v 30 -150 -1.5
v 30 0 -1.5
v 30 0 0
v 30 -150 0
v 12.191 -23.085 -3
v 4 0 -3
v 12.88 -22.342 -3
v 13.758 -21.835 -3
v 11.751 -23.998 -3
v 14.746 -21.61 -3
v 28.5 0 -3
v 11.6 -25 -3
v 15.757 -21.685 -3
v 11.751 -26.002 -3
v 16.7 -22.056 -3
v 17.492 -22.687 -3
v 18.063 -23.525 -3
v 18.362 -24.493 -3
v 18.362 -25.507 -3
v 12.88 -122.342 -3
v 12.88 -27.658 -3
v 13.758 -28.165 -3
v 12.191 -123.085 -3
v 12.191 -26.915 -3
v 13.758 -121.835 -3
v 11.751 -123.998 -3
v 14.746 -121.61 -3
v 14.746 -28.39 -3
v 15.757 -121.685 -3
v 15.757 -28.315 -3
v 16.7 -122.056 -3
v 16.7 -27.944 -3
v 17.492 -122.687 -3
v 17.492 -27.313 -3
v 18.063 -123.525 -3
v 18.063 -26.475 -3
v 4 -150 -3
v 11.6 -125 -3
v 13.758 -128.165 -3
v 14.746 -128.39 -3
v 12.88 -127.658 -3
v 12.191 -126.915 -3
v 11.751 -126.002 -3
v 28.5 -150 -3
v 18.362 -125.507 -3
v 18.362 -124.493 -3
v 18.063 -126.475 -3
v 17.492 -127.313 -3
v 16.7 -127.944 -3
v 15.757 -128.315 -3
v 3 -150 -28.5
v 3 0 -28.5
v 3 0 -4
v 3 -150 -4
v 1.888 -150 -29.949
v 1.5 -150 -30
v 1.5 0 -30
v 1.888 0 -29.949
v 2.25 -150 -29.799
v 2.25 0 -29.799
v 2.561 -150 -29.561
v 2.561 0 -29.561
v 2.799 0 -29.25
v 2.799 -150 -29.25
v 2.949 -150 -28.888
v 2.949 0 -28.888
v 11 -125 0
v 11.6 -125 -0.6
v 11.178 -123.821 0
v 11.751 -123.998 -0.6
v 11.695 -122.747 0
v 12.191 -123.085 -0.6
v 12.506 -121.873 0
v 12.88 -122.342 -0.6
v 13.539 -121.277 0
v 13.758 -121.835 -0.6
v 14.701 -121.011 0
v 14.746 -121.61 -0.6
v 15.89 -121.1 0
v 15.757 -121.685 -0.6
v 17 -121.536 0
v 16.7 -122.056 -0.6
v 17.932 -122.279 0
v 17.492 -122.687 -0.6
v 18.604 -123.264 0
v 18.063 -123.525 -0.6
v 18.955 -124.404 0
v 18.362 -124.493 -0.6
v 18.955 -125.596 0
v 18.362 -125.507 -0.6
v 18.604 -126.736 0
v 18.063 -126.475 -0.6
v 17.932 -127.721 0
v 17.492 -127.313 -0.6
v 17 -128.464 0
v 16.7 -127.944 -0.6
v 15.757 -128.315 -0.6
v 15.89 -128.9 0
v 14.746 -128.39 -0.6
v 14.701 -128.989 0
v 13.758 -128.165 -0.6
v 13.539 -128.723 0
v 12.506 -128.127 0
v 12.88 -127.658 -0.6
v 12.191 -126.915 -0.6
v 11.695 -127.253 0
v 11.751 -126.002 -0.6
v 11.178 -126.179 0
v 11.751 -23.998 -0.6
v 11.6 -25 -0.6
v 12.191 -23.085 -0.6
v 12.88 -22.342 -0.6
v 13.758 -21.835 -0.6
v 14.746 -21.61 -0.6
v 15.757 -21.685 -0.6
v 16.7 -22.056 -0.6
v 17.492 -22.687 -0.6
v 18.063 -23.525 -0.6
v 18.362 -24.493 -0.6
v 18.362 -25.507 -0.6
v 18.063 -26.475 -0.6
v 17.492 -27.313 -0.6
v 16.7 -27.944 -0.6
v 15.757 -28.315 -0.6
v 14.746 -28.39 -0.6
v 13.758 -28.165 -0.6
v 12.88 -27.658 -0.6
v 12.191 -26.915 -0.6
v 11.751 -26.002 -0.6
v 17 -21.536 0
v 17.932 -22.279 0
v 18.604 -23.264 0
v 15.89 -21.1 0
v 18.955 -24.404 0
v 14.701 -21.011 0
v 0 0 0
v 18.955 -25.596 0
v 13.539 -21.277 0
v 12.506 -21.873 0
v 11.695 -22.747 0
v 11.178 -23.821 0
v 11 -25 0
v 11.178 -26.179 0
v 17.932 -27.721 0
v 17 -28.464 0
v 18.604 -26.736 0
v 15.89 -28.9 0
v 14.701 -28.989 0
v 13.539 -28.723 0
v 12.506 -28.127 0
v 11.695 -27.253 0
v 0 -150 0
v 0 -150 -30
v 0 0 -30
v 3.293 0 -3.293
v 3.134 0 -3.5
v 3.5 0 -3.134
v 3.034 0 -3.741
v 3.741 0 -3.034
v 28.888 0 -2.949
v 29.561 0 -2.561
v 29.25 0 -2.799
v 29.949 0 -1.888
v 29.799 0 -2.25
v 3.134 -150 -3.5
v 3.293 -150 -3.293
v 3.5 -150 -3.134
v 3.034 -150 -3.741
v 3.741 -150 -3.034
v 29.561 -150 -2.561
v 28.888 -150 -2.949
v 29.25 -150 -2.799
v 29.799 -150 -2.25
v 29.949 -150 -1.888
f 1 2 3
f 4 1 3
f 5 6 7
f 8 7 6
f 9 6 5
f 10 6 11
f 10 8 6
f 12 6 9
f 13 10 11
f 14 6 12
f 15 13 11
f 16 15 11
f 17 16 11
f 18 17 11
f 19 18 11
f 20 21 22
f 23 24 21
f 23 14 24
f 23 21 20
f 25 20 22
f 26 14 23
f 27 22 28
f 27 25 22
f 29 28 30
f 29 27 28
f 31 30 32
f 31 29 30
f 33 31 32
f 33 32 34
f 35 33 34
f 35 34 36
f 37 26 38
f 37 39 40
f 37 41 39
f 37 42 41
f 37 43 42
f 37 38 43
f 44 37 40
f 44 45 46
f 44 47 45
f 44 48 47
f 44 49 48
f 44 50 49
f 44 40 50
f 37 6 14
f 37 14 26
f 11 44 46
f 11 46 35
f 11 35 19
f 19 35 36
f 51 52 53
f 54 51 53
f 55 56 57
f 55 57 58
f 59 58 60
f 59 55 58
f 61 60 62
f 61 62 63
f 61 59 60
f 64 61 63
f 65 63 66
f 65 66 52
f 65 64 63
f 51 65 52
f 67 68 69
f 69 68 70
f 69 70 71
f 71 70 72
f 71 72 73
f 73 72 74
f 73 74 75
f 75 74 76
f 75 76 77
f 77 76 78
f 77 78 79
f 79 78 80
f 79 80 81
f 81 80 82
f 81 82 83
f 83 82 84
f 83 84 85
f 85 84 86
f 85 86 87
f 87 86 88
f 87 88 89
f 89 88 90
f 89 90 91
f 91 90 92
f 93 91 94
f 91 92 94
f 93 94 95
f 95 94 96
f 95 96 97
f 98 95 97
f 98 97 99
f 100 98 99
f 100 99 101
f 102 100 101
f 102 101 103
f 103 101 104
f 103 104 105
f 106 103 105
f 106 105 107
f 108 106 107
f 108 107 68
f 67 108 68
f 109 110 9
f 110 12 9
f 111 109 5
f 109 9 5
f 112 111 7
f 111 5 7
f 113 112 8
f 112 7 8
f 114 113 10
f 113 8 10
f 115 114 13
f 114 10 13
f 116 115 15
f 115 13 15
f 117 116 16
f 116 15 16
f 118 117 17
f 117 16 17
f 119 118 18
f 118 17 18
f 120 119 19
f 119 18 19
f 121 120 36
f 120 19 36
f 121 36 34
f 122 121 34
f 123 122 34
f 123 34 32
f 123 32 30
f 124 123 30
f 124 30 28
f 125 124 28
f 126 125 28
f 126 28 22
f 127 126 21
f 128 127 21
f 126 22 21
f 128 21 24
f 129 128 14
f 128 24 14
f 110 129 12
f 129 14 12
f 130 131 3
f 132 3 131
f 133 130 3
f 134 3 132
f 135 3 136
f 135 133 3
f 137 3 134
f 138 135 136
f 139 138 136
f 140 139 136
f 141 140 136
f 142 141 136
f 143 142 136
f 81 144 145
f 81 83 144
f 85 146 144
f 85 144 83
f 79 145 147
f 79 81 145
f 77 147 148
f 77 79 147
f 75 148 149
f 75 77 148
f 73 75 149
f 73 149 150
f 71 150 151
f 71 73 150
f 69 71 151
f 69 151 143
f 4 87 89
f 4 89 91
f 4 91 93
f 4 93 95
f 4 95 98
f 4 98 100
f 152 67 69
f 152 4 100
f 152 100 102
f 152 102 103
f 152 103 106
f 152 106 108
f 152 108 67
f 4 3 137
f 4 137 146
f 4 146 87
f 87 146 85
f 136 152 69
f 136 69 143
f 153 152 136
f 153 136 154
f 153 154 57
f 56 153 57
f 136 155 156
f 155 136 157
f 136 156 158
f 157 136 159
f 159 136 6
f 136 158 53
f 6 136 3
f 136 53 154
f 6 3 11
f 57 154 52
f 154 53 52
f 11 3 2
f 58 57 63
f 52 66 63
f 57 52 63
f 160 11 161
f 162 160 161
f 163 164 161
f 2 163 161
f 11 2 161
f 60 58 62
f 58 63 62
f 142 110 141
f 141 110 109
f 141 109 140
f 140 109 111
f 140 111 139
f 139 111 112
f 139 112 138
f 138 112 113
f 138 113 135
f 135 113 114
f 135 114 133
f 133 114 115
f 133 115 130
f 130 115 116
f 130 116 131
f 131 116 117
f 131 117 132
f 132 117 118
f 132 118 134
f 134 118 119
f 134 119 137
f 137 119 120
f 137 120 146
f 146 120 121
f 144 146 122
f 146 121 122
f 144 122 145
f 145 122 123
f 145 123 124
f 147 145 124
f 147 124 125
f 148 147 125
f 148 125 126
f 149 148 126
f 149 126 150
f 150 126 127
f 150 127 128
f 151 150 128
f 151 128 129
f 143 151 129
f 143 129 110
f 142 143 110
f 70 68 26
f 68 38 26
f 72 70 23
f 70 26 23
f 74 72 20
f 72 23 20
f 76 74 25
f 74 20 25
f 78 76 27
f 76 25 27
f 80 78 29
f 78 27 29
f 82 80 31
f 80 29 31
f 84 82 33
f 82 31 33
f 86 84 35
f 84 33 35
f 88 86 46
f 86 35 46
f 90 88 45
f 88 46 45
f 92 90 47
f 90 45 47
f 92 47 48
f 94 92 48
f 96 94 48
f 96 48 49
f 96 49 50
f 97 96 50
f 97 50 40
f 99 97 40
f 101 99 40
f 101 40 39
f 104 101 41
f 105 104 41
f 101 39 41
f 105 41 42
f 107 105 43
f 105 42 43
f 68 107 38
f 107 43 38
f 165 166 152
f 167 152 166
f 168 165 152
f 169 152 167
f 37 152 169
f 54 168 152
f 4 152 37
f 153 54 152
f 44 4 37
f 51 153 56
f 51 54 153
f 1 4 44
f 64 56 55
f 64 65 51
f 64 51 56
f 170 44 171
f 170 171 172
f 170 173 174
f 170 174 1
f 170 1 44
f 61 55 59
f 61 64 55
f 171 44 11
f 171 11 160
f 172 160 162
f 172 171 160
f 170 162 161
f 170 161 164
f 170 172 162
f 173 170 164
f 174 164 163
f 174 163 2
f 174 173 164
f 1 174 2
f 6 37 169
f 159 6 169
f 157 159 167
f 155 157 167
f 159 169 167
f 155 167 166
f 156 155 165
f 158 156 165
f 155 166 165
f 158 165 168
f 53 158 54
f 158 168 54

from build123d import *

# Parameters (mm, degrees)
F4_D           = 6.8
F4_DEPTH       = 5
F4_CSINK_D     = 8
F4_CSINK_ANGLE = 90


with BuildPart() as f2:
    # F2: sweep along a path in F1
    with BuildLine(Plane.YZ) as f2_path:
        Line((0, 0), (-150, 0))
    # F0 (on Front) → F2 (sweep)
    with BuildSketch(Plane.XZ):
        with BuildLine():
            Line((30, 0), (0, 0))
            Line((0, 0), (0, -30))
            Line((0, -30), (1.5, -30))
            ThreePointArc((1.5, -30), (2.56066, -29.56066), (3, -28.5))
            Line((3, -28.5), (3, -4))
            ThreePointArc((3, -4), (3.292893, -3.292893), (4, -3))
            Line((4, -3), (28.5, -3))
            ThreePointArc((28.5, -3), (29.56066, -2.56066), (30, -1.5))
            Line((30, -1.5), (30, 0))
        make_face()
    sweep(path=f2_path.line)

    # F4
    with Locations(Plane.XY):
        with Locations((15, -125), (15, -25)):
            CounterSinkHole(F4_D / 2, F4_CSINK_D / 2, depth=F4_DEPTH, counter_sink_angle=F4_CSINK_ANGLE)


solid = f2.part
